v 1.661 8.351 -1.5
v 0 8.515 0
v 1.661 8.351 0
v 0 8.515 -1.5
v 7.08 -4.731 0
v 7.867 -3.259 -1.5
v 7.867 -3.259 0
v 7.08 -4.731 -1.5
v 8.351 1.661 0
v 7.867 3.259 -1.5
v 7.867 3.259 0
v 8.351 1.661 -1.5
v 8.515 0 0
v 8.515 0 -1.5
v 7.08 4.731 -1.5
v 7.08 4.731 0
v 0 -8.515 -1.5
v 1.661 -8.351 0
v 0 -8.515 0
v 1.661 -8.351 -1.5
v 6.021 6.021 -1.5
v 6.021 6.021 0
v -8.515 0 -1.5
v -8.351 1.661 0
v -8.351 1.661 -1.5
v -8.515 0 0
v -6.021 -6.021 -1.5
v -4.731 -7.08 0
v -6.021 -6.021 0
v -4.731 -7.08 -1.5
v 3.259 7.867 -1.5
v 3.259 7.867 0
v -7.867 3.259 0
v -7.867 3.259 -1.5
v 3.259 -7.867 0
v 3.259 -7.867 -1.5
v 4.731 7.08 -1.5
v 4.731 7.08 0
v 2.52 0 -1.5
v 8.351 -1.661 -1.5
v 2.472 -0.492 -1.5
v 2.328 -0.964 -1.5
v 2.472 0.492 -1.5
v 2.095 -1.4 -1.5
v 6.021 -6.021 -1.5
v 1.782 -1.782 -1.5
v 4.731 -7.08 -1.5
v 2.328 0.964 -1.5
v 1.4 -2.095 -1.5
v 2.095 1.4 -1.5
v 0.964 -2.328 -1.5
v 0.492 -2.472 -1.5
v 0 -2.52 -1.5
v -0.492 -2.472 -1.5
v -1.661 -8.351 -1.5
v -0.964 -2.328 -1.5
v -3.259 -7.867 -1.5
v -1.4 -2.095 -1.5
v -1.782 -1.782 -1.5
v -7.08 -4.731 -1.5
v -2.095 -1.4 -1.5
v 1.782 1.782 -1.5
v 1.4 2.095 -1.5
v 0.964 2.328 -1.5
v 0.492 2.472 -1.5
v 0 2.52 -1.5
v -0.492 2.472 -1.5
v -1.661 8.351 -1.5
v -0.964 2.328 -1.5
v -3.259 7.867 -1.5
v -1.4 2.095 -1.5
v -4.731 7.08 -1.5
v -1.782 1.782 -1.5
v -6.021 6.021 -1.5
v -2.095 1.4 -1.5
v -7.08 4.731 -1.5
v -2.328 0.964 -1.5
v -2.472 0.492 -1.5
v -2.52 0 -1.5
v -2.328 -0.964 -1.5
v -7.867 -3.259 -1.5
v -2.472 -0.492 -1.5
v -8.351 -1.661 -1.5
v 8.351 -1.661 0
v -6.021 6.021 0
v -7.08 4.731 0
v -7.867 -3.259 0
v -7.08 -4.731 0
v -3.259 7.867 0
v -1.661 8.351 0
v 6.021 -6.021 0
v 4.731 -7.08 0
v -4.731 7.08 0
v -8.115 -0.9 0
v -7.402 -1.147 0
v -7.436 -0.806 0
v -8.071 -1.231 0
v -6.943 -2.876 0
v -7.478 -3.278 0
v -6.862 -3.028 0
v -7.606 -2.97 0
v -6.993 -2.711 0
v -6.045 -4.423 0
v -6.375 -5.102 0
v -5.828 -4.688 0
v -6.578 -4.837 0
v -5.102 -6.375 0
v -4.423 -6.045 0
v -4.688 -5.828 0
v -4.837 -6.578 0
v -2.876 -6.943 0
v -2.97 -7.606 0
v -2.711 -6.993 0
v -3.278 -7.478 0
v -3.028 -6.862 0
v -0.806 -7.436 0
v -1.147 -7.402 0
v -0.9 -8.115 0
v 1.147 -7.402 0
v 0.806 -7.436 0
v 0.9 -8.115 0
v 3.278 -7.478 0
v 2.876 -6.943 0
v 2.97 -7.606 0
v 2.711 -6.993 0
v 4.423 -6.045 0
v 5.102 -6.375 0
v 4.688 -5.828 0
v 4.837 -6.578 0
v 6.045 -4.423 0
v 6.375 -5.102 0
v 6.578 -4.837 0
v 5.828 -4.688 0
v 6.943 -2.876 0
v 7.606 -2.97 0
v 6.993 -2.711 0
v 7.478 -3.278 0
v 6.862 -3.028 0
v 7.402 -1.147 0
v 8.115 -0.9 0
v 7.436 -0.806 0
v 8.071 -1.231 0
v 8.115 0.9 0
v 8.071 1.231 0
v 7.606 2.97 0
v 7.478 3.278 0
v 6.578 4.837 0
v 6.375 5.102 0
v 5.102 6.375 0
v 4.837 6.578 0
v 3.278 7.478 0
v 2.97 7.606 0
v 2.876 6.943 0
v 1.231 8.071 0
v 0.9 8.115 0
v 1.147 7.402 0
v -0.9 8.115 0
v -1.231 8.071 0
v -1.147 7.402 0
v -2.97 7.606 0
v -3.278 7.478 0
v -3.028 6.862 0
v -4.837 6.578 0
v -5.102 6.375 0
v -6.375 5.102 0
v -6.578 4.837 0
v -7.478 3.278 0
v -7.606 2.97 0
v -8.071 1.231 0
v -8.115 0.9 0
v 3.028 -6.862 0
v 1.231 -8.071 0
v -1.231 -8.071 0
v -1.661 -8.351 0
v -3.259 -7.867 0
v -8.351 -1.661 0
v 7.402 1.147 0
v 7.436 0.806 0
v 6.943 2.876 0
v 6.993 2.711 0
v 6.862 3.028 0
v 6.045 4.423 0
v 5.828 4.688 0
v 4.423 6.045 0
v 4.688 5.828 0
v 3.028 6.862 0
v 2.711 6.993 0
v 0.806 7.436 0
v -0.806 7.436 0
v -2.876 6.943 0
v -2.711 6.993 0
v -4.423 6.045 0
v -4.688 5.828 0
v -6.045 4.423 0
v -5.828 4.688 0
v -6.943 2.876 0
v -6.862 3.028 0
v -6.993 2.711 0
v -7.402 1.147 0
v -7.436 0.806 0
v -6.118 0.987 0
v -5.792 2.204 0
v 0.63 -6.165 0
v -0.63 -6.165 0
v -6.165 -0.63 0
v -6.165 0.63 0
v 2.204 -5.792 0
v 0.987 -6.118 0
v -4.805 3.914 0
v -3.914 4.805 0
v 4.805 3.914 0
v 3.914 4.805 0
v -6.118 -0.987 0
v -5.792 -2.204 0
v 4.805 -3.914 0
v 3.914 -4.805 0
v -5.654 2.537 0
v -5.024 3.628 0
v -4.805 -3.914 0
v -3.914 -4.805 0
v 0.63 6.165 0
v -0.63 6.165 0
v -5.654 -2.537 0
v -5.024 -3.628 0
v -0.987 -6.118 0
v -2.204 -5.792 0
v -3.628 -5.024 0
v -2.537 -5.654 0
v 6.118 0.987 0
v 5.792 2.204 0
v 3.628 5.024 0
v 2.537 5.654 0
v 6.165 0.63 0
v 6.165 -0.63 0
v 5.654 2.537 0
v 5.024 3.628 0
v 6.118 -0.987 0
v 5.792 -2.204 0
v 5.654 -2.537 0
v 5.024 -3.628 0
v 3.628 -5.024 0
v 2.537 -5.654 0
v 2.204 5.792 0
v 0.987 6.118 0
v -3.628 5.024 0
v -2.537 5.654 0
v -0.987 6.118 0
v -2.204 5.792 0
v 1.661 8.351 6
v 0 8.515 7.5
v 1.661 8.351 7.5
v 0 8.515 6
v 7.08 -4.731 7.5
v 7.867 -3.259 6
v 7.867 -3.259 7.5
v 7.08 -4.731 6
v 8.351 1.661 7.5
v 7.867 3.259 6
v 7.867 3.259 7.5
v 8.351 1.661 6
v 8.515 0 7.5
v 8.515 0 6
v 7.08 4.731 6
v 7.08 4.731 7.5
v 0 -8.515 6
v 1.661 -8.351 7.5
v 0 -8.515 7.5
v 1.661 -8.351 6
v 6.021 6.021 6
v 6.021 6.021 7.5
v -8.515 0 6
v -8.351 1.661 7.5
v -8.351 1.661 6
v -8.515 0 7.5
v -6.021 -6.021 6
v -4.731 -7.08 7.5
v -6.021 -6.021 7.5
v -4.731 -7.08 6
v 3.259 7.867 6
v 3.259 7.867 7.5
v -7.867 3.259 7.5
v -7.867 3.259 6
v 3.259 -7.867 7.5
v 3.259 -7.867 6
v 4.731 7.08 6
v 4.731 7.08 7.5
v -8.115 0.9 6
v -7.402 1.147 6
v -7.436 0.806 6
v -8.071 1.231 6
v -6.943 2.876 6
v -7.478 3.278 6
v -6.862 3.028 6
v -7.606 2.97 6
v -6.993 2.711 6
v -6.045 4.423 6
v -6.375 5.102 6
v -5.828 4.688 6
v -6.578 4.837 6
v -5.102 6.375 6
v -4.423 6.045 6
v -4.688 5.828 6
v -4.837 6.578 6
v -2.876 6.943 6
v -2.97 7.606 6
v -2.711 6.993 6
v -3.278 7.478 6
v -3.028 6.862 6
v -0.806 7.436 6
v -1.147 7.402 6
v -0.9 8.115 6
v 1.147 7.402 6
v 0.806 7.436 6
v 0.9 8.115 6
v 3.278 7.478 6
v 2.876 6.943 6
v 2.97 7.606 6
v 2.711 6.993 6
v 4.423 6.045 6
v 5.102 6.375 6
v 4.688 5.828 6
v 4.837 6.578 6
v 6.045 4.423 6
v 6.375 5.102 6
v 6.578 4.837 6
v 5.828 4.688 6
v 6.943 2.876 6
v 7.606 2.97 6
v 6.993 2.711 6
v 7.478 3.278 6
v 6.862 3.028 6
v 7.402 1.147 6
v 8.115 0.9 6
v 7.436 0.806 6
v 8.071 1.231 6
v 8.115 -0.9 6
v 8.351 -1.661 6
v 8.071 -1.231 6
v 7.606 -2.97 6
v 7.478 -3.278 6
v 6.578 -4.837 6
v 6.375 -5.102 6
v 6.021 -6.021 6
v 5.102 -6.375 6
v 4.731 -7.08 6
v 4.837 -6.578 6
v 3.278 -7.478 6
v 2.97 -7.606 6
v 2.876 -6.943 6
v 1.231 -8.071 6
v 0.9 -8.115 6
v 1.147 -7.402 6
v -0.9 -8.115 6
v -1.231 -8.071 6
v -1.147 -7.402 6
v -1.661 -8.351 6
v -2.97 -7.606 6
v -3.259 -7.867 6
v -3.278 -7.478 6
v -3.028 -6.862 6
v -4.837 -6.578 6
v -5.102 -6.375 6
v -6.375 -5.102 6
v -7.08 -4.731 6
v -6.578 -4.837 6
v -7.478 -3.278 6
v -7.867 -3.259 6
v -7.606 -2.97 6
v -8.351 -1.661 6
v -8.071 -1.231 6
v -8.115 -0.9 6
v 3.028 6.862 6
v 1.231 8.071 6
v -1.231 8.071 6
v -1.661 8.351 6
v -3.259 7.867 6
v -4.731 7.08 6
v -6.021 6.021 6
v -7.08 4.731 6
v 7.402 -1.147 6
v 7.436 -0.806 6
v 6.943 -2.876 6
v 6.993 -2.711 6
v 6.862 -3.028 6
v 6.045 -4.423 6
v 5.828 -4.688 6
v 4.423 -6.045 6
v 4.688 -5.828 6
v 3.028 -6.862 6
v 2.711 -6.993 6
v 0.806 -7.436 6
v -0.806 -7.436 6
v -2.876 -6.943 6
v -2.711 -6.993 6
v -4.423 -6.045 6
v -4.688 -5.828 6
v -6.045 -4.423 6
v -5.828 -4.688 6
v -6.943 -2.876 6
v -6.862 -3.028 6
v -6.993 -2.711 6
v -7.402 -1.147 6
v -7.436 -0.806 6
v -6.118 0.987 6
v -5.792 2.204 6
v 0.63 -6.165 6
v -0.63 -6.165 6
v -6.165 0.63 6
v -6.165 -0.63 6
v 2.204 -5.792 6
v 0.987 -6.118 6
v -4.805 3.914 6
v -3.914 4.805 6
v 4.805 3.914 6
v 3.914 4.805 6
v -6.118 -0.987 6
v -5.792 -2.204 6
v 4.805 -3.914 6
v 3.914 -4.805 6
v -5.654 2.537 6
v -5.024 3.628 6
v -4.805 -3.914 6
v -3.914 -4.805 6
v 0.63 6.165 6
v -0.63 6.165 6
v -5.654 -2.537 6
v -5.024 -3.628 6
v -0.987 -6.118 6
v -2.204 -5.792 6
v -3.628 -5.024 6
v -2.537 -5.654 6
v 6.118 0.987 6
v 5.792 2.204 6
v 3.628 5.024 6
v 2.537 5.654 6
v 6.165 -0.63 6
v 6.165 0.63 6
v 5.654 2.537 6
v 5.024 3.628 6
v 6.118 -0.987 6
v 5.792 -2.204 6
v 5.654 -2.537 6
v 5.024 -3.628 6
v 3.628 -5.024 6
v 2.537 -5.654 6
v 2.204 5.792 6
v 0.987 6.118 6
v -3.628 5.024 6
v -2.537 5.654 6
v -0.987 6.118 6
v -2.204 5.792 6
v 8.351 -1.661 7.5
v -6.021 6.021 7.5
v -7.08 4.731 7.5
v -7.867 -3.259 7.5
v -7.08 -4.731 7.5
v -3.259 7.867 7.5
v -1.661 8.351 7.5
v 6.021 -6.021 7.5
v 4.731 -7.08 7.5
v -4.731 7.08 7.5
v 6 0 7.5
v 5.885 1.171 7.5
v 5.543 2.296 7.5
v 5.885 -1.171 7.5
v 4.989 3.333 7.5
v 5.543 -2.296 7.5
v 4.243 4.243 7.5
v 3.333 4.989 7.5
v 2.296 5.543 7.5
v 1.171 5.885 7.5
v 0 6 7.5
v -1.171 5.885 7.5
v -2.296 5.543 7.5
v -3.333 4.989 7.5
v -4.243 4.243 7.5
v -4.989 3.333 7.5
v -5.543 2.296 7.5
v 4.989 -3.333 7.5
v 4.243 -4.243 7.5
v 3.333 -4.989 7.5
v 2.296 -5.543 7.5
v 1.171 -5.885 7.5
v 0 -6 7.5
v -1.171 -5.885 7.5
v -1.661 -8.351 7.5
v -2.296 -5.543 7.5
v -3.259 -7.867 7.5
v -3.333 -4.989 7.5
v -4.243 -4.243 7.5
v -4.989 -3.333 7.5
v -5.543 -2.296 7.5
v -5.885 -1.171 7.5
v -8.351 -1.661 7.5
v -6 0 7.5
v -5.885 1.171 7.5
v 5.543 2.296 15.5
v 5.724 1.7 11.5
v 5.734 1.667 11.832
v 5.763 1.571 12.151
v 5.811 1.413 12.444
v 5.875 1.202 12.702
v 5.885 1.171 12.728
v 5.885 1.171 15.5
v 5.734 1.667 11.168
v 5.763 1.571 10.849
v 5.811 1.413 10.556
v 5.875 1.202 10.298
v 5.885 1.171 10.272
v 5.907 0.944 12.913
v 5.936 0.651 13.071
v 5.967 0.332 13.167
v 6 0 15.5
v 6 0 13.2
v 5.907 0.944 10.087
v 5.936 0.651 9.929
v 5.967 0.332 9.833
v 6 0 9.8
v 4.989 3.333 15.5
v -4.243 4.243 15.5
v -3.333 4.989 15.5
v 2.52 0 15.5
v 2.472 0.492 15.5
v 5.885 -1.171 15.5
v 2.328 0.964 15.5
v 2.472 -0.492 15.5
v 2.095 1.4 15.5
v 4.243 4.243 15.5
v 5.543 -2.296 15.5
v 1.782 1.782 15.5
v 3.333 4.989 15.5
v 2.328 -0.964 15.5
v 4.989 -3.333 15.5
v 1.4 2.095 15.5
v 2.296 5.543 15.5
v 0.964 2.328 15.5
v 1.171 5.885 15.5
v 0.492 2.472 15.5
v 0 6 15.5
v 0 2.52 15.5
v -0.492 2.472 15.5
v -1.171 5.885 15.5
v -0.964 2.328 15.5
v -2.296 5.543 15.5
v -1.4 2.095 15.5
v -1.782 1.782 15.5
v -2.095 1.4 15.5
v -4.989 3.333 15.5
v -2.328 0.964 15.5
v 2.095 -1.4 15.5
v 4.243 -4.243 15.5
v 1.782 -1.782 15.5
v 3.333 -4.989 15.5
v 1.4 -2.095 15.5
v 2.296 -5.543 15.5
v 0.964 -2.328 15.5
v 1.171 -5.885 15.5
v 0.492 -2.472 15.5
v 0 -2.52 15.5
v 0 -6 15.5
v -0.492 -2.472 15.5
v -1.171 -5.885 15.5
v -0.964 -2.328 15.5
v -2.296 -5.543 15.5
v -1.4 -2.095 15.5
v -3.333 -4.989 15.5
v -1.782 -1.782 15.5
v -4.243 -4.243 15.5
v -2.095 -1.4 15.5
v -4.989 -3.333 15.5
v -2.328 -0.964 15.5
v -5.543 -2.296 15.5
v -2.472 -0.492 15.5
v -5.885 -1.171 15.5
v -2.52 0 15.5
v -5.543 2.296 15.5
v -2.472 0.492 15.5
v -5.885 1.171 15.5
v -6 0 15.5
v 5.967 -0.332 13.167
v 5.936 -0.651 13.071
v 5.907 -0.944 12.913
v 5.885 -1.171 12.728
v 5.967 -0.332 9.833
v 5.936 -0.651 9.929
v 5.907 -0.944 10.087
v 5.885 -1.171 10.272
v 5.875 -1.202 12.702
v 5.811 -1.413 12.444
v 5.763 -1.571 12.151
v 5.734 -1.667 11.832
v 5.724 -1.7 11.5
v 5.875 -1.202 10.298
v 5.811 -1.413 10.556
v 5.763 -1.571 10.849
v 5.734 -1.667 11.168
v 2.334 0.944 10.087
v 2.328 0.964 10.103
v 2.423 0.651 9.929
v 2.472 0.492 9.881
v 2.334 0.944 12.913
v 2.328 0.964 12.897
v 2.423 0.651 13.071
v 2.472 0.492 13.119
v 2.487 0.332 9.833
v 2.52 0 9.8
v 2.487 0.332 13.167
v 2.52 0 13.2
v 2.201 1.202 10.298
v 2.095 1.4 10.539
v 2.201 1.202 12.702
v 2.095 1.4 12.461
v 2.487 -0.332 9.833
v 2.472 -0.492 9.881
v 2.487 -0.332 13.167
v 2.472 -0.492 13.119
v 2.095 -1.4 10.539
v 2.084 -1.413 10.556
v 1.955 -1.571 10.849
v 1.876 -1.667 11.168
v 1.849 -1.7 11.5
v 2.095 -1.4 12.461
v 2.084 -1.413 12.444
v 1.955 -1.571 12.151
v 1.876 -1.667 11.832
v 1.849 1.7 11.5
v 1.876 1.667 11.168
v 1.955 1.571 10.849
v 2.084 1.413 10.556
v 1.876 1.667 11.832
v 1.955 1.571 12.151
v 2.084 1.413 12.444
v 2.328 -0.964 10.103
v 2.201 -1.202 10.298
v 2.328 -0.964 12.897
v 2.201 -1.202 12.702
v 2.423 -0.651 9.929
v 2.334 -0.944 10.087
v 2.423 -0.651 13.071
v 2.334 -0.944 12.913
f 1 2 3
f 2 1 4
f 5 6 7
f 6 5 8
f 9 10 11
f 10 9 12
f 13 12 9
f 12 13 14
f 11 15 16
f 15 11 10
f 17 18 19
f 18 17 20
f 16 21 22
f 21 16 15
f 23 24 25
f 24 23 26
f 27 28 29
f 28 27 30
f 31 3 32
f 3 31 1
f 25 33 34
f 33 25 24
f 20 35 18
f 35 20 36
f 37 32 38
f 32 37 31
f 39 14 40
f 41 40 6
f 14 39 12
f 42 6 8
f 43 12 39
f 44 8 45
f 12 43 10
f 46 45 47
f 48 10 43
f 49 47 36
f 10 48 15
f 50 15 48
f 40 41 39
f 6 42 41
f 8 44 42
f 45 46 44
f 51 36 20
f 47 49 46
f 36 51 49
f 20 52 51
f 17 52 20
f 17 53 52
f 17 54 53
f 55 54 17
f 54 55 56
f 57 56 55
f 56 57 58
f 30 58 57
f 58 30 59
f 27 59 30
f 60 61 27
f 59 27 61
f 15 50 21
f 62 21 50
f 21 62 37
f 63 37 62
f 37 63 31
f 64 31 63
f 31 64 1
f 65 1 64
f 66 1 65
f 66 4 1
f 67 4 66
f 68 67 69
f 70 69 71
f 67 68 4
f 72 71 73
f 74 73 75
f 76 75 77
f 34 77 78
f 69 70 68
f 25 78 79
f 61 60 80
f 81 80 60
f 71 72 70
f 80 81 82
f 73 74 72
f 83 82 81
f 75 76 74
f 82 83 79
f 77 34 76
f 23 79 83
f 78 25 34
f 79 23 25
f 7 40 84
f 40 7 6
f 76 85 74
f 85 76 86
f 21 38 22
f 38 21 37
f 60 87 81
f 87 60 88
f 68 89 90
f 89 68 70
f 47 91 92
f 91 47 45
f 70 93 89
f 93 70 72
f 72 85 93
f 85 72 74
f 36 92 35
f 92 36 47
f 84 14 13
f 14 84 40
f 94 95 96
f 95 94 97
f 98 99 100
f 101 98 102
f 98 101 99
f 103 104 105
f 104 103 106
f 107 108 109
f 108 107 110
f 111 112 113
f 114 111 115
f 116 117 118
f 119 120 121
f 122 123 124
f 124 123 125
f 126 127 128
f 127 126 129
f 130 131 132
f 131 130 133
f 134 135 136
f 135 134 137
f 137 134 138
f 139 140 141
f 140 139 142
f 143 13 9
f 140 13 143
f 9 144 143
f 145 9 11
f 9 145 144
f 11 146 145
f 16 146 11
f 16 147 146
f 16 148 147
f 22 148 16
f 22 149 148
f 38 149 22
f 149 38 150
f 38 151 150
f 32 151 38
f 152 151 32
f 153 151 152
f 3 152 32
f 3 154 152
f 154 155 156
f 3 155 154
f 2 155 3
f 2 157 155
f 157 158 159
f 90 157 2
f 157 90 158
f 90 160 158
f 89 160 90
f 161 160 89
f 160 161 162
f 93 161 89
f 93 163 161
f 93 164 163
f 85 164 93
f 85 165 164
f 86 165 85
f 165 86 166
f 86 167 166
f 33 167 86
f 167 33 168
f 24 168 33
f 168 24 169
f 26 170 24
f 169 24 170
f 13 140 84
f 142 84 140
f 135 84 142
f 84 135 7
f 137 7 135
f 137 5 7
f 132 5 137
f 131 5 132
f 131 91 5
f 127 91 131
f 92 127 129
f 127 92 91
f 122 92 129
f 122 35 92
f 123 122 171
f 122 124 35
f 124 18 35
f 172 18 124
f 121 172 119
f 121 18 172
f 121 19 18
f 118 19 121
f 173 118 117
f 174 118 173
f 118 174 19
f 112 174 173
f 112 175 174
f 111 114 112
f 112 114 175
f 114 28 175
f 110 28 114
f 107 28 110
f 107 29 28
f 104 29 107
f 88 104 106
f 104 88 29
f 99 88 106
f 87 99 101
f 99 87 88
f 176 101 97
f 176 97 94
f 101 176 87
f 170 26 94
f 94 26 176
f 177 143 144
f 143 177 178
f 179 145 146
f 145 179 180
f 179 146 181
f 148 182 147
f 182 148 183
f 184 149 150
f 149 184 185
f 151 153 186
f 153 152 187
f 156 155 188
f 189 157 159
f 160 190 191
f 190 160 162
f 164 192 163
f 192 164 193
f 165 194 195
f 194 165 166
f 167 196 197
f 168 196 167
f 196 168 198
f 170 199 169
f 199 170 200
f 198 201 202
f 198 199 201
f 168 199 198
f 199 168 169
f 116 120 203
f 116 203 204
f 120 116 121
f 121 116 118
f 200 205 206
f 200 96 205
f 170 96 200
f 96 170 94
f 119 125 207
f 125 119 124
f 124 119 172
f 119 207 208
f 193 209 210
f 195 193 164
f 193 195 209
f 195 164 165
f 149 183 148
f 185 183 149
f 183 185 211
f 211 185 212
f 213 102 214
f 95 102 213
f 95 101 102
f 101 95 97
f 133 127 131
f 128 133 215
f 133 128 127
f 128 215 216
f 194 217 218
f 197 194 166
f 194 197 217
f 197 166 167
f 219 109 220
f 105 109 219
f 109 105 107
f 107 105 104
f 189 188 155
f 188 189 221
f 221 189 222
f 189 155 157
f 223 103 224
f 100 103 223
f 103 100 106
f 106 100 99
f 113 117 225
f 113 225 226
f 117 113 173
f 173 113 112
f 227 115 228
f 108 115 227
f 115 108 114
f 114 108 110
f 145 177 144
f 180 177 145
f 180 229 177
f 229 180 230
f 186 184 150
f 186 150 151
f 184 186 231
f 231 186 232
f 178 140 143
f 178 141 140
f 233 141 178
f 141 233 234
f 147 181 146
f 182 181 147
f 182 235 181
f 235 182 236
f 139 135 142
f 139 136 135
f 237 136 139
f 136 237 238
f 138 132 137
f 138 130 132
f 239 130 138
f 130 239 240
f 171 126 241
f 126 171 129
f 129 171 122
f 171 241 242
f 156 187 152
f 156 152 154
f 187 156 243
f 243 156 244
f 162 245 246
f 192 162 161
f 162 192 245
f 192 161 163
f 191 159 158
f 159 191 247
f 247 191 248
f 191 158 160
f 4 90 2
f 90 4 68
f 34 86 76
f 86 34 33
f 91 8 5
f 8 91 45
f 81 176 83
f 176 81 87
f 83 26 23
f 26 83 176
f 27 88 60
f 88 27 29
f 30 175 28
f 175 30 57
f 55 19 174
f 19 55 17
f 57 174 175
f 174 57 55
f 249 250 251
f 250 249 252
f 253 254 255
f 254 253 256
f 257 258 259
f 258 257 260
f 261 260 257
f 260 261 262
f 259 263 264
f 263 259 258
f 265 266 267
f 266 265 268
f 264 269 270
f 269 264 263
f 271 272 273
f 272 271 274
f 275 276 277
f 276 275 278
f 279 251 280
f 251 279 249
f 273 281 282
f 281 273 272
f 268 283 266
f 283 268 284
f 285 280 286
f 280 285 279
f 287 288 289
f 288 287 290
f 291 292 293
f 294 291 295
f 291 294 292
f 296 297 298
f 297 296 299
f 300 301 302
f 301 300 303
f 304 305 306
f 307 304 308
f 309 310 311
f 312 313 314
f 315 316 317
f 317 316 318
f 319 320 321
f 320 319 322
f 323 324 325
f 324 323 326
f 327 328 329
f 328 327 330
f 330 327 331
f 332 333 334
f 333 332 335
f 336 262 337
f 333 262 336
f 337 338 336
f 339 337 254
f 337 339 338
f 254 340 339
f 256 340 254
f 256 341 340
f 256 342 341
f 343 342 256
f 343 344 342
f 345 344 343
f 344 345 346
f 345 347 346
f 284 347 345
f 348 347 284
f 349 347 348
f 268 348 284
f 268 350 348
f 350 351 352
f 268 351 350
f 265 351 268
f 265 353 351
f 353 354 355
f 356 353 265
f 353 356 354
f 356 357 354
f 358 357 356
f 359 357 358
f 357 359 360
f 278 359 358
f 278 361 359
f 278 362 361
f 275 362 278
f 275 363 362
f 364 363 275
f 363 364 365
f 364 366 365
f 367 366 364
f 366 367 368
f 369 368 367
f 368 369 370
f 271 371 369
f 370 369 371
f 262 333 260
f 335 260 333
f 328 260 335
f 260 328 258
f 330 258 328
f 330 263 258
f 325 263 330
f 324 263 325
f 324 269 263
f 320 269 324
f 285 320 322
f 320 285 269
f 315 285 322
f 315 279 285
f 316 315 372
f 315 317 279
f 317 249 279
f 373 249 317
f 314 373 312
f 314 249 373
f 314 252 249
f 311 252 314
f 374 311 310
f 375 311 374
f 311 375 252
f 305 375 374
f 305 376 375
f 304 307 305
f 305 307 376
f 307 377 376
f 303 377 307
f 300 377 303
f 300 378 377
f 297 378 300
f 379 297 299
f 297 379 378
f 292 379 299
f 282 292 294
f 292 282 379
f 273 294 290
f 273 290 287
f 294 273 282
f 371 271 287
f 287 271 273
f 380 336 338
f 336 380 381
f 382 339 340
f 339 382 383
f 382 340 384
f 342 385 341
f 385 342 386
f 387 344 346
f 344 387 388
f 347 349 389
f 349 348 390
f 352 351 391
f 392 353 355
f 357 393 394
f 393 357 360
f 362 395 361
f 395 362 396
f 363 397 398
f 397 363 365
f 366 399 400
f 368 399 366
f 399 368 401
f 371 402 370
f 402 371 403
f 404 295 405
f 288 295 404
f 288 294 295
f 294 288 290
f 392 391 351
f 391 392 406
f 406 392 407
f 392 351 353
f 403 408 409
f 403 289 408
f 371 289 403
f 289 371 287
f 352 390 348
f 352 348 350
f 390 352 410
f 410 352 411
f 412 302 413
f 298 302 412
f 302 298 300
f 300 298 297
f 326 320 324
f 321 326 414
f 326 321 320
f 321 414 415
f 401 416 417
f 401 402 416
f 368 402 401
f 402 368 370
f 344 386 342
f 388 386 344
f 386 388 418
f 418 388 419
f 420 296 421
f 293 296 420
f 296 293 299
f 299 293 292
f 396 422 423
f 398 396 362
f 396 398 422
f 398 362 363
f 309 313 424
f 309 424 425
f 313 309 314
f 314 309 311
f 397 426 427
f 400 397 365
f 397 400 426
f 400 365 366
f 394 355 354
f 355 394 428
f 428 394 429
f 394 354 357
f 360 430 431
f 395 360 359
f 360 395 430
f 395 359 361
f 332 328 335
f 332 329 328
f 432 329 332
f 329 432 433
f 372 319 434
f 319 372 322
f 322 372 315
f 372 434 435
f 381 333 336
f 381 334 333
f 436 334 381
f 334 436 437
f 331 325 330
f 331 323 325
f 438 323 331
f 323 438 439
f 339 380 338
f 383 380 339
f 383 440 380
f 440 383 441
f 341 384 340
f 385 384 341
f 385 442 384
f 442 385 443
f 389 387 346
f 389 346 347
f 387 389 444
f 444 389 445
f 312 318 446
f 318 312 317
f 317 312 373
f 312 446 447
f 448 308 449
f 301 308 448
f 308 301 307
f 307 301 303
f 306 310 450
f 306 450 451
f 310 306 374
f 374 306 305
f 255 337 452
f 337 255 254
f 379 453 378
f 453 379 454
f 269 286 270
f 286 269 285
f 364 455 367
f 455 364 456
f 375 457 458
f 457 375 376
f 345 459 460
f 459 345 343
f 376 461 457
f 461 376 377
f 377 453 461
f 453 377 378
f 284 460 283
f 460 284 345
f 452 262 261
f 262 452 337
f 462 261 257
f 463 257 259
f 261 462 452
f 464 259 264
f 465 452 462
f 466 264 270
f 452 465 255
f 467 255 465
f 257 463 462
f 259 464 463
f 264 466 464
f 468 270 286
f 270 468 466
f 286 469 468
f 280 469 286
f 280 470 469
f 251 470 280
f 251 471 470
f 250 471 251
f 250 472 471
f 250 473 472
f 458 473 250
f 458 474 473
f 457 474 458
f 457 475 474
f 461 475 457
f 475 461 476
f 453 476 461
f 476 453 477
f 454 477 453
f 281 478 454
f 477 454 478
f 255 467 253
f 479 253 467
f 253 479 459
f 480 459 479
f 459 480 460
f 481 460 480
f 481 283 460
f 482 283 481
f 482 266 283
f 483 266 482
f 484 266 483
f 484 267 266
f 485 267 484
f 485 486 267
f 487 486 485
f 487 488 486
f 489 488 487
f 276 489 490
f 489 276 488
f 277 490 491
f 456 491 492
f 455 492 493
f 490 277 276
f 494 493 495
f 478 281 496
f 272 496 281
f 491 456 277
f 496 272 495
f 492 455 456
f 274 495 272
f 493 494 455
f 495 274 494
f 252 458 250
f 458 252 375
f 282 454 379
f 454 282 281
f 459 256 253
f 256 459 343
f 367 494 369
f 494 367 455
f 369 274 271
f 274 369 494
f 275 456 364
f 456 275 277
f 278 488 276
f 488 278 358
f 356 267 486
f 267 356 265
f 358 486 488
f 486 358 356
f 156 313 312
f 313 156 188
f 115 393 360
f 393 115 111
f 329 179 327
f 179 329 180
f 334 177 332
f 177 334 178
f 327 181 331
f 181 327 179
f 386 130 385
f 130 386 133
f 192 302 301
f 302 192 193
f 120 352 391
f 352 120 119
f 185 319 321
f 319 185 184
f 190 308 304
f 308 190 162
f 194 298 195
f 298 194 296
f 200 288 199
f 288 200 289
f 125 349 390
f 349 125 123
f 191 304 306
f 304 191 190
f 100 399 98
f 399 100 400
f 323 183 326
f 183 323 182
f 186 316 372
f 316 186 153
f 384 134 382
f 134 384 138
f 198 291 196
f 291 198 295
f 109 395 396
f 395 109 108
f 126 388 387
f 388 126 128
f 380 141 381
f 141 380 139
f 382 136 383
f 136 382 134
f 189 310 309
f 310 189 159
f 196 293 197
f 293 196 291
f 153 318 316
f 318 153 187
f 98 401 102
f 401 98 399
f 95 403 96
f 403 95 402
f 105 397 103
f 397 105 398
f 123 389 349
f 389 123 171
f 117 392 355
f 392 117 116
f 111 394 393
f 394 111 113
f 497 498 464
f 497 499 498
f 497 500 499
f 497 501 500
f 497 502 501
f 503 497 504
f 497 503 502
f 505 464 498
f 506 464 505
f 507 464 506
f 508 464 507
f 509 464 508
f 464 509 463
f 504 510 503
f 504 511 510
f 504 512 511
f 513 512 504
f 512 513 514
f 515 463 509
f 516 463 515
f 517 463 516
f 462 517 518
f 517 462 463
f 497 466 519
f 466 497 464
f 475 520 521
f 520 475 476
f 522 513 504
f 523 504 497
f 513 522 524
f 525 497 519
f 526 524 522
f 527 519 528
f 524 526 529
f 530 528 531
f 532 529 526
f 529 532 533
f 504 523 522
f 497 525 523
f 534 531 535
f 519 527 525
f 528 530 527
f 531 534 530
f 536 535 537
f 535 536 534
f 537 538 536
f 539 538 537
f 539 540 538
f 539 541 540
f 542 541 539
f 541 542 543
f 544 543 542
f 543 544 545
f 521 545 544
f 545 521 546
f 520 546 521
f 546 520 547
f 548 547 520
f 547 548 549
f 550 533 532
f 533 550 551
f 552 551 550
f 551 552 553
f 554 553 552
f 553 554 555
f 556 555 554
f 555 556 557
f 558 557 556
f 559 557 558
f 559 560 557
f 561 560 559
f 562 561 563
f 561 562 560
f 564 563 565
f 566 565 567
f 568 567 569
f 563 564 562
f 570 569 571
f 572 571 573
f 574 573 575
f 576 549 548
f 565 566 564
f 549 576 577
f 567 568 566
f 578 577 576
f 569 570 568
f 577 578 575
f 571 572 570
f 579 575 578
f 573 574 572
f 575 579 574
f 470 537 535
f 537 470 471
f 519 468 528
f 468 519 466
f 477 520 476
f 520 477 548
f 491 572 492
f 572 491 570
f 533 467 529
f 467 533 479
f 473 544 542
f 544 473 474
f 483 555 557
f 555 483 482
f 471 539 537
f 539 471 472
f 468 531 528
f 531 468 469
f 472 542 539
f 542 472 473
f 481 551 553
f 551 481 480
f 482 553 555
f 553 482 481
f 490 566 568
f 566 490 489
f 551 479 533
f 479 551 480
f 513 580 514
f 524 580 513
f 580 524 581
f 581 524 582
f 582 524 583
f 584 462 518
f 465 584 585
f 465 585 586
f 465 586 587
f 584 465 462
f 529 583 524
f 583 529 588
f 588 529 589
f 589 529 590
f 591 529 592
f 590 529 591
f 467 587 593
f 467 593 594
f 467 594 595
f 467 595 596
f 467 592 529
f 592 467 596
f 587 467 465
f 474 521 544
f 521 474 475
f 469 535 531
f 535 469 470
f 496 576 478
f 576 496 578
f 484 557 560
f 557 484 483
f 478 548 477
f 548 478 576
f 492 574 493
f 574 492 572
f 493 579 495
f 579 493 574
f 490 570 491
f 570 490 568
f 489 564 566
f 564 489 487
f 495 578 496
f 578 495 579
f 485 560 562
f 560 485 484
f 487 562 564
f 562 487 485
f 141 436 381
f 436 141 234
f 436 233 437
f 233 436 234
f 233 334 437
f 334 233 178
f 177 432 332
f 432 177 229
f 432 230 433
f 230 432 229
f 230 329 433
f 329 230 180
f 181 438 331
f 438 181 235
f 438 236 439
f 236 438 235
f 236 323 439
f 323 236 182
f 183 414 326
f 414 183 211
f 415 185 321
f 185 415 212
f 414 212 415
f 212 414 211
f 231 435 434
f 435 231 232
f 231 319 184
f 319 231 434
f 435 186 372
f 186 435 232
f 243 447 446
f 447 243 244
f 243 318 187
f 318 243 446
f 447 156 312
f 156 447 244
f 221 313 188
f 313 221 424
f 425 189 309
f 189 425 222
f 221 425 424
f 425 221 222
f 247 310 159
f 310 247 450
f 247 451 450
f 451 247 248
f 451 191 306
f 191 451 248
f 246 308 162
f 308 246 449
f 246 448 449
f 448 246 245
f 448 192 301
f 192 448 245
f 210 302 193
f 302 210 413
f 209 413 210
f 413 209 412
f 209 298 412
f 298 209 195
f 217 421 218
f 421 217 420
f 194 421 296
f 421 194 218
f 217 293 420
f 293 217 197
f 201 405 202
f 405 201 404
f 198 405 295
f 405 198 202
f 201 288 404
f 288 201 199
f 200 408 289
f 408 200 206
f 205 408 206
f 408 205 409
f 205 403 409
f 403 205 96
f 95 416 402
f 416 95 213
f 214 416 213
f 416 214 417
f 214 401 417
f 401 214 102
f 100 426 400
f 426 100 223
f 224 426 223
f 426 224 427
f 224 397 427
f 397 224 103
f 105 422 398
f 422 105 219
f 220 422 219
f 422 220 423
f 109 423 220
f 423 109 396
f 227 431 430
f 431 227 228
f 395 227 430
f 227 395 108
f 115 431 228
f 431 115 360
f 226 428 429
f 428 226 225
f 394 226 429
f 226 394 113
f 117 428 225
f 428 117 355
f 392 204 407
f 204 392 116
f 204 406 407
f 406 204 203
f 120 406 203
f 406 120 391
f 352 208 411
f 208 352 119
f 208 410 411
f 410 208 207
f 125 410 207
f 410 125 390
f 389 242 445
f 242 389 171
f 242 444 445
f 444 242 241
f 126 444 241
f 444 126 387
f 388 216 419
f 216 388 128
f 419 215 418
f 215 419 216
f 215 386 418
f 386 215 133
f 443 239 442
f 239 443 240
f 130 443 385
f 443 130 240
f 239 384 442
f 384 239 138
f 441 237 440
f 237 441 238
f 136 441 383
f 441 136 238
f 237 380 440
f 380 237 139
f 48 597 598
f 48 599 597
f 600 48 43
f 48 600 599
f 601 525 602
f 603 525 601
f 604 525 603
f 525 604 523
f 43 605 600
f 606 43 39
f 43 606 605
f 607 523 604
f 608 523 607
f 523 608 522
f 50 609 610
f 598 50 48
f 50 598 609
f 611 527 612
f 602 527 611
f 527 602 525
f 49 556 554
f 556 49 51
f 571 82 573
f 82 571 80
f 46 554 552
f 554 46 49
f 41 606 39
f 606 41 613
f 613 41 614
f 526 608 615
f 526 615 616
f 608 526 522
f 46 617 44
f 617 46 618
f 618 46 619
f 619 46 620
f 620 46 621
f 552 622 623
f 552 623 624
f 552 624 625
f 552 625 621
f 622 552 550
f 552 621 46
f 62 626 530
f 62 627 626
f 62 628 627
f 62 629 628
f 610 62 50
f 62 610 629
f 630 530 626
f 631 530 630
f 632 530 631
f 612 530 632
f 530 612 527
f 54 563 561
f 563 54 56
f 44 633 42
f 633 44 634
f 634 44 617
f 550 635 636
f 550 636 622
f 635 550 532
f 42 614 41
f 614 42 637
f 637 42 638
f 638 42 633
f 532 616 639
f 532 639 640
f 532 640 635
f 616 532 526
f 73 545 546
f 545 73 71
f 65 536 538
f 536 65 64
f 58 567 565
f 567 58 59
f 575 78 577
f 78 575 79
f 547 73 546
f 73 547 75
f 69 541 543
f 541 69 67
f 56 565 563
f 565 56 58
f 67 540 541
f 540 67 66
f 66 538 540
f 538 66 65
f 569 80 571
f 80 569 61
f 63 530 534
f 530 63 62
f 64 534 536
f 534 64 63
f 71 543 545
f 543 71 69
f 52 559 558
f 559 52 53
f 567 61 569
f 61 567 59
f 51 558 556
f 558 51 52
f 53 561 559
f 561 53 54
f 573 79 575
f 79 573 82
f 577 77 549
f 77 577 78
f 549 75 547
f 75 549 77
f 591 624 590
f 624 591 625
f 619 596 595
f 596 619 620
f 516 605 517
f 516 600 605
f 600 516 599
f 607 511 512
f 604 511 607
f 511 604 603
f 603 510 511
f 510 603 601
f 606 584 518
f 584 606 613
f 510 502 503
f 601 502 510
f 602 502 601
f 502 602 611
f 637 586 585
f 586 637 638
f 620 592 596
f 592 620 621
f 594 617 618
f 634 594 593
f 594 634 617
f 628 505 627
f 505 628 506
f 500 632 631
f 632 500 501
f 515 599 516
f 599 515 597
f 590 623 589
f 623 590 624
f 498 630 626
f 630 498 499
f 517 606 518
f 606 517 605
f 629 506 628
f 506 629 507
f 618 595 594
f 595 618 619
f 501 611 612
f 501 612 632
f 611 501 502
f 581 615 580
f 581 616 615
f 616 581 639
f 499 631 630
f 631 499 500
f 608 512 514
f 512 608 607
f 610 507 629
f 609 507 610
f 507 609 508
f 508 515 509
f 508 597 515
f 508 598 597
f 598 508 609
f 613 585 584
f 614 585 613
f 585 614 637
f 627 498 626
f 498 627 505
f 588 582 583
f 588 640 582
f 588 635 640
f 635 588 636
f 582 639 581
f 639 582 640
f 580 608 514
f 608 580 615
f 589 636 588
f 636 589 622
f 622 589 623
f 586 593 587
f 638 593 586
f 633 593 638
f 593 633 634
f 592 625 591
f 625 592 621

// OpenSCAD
$fn = 32;

// ----------------------------------------------------------------------
// Timing pulley: GT2 24T, pitch 2 mm, 17.03 mm x 17 mm
// ----------------------------------------------------------------------

// --- parameters (mm) ---
pitch_mm = 2;             // belt pitch
tooth_count = 24;         // number of grooves
width = 6;                // belt width between the flanges
tip_d = 15.03;            // tip circle diameter
root_d = 13.53;           // groove bottom diameter
groove_h = 0.75;          // groove depth
tooth_w = 1.5;            // groove width at the tip circle
side_d = 17.03;           // flange diameter
side_t = 1.5;             // flange thickness
spigot_d = 11.93;         // flange spigot, sunk into the rim
spigot_h = 1.2;           // spigot depth into the rim
hub_bore = 5.04;          // shaft bore
hub_d = 12;               // hub diameter
hub_h = 8;                // hub above the flange
bottom_z = -1.5;          // lowest point of the pulley
top_z = 15.5;             // highest point of the pulley
set_d = 3.4;              // set screw tap hole

module rim() {
  cylinder(h = width, d = tip_d);
}

module groove_cutter() {
  /* belt tooth groove: deeper than wide, cut through the belt width */
  translate([root_d / 2, 0, 0])
    linear_extrude(height = width)
      polygon(points = [[-0.6, -tooth_w * 0.42], [groove_h + 0.6, -tooth_w * 0.6],
                        [groove_h + 0.6, tooth_w * 0.6], [-0.6, tooth_w * 0.42]]);
}

module flanges() {
  translate([0, 0, -side_t]) cylinder(h = side_t, d = side_d);
  translate([0, 0, width]) cylinder(h = side_t, d = side_d);
  translate([0, 0, -spigot_h]) cylinder(h = spigot_h + 0.6, d = spigot_d);
  translate([0, 0, width - 0.6]) cylinder(h = spigot_h + 0.6, d = spigot_d);
}

module hub() {
  translate([0, 0, bottom_z]) cylinder(h = top_z - bottom_z, d = hub_d);
}

difference() {
  union() {
    rim();
    hub();
    flanges();
  }
  for (i = [0 : tooth_count - 1]) rotate([0, 0, i * 360 / tooth_count]) groove_cutter();
  translate([0, 0, bottom_z - 1]) cylinder(h = top_z - bottom_z + 2, d = hub_bore);
  translate([-1, 0, top_z - hub_h * 0.5]) rotate([0, 90, 0]) cylinder(h = hub_d / 2 + 3, d = set_d);
}
